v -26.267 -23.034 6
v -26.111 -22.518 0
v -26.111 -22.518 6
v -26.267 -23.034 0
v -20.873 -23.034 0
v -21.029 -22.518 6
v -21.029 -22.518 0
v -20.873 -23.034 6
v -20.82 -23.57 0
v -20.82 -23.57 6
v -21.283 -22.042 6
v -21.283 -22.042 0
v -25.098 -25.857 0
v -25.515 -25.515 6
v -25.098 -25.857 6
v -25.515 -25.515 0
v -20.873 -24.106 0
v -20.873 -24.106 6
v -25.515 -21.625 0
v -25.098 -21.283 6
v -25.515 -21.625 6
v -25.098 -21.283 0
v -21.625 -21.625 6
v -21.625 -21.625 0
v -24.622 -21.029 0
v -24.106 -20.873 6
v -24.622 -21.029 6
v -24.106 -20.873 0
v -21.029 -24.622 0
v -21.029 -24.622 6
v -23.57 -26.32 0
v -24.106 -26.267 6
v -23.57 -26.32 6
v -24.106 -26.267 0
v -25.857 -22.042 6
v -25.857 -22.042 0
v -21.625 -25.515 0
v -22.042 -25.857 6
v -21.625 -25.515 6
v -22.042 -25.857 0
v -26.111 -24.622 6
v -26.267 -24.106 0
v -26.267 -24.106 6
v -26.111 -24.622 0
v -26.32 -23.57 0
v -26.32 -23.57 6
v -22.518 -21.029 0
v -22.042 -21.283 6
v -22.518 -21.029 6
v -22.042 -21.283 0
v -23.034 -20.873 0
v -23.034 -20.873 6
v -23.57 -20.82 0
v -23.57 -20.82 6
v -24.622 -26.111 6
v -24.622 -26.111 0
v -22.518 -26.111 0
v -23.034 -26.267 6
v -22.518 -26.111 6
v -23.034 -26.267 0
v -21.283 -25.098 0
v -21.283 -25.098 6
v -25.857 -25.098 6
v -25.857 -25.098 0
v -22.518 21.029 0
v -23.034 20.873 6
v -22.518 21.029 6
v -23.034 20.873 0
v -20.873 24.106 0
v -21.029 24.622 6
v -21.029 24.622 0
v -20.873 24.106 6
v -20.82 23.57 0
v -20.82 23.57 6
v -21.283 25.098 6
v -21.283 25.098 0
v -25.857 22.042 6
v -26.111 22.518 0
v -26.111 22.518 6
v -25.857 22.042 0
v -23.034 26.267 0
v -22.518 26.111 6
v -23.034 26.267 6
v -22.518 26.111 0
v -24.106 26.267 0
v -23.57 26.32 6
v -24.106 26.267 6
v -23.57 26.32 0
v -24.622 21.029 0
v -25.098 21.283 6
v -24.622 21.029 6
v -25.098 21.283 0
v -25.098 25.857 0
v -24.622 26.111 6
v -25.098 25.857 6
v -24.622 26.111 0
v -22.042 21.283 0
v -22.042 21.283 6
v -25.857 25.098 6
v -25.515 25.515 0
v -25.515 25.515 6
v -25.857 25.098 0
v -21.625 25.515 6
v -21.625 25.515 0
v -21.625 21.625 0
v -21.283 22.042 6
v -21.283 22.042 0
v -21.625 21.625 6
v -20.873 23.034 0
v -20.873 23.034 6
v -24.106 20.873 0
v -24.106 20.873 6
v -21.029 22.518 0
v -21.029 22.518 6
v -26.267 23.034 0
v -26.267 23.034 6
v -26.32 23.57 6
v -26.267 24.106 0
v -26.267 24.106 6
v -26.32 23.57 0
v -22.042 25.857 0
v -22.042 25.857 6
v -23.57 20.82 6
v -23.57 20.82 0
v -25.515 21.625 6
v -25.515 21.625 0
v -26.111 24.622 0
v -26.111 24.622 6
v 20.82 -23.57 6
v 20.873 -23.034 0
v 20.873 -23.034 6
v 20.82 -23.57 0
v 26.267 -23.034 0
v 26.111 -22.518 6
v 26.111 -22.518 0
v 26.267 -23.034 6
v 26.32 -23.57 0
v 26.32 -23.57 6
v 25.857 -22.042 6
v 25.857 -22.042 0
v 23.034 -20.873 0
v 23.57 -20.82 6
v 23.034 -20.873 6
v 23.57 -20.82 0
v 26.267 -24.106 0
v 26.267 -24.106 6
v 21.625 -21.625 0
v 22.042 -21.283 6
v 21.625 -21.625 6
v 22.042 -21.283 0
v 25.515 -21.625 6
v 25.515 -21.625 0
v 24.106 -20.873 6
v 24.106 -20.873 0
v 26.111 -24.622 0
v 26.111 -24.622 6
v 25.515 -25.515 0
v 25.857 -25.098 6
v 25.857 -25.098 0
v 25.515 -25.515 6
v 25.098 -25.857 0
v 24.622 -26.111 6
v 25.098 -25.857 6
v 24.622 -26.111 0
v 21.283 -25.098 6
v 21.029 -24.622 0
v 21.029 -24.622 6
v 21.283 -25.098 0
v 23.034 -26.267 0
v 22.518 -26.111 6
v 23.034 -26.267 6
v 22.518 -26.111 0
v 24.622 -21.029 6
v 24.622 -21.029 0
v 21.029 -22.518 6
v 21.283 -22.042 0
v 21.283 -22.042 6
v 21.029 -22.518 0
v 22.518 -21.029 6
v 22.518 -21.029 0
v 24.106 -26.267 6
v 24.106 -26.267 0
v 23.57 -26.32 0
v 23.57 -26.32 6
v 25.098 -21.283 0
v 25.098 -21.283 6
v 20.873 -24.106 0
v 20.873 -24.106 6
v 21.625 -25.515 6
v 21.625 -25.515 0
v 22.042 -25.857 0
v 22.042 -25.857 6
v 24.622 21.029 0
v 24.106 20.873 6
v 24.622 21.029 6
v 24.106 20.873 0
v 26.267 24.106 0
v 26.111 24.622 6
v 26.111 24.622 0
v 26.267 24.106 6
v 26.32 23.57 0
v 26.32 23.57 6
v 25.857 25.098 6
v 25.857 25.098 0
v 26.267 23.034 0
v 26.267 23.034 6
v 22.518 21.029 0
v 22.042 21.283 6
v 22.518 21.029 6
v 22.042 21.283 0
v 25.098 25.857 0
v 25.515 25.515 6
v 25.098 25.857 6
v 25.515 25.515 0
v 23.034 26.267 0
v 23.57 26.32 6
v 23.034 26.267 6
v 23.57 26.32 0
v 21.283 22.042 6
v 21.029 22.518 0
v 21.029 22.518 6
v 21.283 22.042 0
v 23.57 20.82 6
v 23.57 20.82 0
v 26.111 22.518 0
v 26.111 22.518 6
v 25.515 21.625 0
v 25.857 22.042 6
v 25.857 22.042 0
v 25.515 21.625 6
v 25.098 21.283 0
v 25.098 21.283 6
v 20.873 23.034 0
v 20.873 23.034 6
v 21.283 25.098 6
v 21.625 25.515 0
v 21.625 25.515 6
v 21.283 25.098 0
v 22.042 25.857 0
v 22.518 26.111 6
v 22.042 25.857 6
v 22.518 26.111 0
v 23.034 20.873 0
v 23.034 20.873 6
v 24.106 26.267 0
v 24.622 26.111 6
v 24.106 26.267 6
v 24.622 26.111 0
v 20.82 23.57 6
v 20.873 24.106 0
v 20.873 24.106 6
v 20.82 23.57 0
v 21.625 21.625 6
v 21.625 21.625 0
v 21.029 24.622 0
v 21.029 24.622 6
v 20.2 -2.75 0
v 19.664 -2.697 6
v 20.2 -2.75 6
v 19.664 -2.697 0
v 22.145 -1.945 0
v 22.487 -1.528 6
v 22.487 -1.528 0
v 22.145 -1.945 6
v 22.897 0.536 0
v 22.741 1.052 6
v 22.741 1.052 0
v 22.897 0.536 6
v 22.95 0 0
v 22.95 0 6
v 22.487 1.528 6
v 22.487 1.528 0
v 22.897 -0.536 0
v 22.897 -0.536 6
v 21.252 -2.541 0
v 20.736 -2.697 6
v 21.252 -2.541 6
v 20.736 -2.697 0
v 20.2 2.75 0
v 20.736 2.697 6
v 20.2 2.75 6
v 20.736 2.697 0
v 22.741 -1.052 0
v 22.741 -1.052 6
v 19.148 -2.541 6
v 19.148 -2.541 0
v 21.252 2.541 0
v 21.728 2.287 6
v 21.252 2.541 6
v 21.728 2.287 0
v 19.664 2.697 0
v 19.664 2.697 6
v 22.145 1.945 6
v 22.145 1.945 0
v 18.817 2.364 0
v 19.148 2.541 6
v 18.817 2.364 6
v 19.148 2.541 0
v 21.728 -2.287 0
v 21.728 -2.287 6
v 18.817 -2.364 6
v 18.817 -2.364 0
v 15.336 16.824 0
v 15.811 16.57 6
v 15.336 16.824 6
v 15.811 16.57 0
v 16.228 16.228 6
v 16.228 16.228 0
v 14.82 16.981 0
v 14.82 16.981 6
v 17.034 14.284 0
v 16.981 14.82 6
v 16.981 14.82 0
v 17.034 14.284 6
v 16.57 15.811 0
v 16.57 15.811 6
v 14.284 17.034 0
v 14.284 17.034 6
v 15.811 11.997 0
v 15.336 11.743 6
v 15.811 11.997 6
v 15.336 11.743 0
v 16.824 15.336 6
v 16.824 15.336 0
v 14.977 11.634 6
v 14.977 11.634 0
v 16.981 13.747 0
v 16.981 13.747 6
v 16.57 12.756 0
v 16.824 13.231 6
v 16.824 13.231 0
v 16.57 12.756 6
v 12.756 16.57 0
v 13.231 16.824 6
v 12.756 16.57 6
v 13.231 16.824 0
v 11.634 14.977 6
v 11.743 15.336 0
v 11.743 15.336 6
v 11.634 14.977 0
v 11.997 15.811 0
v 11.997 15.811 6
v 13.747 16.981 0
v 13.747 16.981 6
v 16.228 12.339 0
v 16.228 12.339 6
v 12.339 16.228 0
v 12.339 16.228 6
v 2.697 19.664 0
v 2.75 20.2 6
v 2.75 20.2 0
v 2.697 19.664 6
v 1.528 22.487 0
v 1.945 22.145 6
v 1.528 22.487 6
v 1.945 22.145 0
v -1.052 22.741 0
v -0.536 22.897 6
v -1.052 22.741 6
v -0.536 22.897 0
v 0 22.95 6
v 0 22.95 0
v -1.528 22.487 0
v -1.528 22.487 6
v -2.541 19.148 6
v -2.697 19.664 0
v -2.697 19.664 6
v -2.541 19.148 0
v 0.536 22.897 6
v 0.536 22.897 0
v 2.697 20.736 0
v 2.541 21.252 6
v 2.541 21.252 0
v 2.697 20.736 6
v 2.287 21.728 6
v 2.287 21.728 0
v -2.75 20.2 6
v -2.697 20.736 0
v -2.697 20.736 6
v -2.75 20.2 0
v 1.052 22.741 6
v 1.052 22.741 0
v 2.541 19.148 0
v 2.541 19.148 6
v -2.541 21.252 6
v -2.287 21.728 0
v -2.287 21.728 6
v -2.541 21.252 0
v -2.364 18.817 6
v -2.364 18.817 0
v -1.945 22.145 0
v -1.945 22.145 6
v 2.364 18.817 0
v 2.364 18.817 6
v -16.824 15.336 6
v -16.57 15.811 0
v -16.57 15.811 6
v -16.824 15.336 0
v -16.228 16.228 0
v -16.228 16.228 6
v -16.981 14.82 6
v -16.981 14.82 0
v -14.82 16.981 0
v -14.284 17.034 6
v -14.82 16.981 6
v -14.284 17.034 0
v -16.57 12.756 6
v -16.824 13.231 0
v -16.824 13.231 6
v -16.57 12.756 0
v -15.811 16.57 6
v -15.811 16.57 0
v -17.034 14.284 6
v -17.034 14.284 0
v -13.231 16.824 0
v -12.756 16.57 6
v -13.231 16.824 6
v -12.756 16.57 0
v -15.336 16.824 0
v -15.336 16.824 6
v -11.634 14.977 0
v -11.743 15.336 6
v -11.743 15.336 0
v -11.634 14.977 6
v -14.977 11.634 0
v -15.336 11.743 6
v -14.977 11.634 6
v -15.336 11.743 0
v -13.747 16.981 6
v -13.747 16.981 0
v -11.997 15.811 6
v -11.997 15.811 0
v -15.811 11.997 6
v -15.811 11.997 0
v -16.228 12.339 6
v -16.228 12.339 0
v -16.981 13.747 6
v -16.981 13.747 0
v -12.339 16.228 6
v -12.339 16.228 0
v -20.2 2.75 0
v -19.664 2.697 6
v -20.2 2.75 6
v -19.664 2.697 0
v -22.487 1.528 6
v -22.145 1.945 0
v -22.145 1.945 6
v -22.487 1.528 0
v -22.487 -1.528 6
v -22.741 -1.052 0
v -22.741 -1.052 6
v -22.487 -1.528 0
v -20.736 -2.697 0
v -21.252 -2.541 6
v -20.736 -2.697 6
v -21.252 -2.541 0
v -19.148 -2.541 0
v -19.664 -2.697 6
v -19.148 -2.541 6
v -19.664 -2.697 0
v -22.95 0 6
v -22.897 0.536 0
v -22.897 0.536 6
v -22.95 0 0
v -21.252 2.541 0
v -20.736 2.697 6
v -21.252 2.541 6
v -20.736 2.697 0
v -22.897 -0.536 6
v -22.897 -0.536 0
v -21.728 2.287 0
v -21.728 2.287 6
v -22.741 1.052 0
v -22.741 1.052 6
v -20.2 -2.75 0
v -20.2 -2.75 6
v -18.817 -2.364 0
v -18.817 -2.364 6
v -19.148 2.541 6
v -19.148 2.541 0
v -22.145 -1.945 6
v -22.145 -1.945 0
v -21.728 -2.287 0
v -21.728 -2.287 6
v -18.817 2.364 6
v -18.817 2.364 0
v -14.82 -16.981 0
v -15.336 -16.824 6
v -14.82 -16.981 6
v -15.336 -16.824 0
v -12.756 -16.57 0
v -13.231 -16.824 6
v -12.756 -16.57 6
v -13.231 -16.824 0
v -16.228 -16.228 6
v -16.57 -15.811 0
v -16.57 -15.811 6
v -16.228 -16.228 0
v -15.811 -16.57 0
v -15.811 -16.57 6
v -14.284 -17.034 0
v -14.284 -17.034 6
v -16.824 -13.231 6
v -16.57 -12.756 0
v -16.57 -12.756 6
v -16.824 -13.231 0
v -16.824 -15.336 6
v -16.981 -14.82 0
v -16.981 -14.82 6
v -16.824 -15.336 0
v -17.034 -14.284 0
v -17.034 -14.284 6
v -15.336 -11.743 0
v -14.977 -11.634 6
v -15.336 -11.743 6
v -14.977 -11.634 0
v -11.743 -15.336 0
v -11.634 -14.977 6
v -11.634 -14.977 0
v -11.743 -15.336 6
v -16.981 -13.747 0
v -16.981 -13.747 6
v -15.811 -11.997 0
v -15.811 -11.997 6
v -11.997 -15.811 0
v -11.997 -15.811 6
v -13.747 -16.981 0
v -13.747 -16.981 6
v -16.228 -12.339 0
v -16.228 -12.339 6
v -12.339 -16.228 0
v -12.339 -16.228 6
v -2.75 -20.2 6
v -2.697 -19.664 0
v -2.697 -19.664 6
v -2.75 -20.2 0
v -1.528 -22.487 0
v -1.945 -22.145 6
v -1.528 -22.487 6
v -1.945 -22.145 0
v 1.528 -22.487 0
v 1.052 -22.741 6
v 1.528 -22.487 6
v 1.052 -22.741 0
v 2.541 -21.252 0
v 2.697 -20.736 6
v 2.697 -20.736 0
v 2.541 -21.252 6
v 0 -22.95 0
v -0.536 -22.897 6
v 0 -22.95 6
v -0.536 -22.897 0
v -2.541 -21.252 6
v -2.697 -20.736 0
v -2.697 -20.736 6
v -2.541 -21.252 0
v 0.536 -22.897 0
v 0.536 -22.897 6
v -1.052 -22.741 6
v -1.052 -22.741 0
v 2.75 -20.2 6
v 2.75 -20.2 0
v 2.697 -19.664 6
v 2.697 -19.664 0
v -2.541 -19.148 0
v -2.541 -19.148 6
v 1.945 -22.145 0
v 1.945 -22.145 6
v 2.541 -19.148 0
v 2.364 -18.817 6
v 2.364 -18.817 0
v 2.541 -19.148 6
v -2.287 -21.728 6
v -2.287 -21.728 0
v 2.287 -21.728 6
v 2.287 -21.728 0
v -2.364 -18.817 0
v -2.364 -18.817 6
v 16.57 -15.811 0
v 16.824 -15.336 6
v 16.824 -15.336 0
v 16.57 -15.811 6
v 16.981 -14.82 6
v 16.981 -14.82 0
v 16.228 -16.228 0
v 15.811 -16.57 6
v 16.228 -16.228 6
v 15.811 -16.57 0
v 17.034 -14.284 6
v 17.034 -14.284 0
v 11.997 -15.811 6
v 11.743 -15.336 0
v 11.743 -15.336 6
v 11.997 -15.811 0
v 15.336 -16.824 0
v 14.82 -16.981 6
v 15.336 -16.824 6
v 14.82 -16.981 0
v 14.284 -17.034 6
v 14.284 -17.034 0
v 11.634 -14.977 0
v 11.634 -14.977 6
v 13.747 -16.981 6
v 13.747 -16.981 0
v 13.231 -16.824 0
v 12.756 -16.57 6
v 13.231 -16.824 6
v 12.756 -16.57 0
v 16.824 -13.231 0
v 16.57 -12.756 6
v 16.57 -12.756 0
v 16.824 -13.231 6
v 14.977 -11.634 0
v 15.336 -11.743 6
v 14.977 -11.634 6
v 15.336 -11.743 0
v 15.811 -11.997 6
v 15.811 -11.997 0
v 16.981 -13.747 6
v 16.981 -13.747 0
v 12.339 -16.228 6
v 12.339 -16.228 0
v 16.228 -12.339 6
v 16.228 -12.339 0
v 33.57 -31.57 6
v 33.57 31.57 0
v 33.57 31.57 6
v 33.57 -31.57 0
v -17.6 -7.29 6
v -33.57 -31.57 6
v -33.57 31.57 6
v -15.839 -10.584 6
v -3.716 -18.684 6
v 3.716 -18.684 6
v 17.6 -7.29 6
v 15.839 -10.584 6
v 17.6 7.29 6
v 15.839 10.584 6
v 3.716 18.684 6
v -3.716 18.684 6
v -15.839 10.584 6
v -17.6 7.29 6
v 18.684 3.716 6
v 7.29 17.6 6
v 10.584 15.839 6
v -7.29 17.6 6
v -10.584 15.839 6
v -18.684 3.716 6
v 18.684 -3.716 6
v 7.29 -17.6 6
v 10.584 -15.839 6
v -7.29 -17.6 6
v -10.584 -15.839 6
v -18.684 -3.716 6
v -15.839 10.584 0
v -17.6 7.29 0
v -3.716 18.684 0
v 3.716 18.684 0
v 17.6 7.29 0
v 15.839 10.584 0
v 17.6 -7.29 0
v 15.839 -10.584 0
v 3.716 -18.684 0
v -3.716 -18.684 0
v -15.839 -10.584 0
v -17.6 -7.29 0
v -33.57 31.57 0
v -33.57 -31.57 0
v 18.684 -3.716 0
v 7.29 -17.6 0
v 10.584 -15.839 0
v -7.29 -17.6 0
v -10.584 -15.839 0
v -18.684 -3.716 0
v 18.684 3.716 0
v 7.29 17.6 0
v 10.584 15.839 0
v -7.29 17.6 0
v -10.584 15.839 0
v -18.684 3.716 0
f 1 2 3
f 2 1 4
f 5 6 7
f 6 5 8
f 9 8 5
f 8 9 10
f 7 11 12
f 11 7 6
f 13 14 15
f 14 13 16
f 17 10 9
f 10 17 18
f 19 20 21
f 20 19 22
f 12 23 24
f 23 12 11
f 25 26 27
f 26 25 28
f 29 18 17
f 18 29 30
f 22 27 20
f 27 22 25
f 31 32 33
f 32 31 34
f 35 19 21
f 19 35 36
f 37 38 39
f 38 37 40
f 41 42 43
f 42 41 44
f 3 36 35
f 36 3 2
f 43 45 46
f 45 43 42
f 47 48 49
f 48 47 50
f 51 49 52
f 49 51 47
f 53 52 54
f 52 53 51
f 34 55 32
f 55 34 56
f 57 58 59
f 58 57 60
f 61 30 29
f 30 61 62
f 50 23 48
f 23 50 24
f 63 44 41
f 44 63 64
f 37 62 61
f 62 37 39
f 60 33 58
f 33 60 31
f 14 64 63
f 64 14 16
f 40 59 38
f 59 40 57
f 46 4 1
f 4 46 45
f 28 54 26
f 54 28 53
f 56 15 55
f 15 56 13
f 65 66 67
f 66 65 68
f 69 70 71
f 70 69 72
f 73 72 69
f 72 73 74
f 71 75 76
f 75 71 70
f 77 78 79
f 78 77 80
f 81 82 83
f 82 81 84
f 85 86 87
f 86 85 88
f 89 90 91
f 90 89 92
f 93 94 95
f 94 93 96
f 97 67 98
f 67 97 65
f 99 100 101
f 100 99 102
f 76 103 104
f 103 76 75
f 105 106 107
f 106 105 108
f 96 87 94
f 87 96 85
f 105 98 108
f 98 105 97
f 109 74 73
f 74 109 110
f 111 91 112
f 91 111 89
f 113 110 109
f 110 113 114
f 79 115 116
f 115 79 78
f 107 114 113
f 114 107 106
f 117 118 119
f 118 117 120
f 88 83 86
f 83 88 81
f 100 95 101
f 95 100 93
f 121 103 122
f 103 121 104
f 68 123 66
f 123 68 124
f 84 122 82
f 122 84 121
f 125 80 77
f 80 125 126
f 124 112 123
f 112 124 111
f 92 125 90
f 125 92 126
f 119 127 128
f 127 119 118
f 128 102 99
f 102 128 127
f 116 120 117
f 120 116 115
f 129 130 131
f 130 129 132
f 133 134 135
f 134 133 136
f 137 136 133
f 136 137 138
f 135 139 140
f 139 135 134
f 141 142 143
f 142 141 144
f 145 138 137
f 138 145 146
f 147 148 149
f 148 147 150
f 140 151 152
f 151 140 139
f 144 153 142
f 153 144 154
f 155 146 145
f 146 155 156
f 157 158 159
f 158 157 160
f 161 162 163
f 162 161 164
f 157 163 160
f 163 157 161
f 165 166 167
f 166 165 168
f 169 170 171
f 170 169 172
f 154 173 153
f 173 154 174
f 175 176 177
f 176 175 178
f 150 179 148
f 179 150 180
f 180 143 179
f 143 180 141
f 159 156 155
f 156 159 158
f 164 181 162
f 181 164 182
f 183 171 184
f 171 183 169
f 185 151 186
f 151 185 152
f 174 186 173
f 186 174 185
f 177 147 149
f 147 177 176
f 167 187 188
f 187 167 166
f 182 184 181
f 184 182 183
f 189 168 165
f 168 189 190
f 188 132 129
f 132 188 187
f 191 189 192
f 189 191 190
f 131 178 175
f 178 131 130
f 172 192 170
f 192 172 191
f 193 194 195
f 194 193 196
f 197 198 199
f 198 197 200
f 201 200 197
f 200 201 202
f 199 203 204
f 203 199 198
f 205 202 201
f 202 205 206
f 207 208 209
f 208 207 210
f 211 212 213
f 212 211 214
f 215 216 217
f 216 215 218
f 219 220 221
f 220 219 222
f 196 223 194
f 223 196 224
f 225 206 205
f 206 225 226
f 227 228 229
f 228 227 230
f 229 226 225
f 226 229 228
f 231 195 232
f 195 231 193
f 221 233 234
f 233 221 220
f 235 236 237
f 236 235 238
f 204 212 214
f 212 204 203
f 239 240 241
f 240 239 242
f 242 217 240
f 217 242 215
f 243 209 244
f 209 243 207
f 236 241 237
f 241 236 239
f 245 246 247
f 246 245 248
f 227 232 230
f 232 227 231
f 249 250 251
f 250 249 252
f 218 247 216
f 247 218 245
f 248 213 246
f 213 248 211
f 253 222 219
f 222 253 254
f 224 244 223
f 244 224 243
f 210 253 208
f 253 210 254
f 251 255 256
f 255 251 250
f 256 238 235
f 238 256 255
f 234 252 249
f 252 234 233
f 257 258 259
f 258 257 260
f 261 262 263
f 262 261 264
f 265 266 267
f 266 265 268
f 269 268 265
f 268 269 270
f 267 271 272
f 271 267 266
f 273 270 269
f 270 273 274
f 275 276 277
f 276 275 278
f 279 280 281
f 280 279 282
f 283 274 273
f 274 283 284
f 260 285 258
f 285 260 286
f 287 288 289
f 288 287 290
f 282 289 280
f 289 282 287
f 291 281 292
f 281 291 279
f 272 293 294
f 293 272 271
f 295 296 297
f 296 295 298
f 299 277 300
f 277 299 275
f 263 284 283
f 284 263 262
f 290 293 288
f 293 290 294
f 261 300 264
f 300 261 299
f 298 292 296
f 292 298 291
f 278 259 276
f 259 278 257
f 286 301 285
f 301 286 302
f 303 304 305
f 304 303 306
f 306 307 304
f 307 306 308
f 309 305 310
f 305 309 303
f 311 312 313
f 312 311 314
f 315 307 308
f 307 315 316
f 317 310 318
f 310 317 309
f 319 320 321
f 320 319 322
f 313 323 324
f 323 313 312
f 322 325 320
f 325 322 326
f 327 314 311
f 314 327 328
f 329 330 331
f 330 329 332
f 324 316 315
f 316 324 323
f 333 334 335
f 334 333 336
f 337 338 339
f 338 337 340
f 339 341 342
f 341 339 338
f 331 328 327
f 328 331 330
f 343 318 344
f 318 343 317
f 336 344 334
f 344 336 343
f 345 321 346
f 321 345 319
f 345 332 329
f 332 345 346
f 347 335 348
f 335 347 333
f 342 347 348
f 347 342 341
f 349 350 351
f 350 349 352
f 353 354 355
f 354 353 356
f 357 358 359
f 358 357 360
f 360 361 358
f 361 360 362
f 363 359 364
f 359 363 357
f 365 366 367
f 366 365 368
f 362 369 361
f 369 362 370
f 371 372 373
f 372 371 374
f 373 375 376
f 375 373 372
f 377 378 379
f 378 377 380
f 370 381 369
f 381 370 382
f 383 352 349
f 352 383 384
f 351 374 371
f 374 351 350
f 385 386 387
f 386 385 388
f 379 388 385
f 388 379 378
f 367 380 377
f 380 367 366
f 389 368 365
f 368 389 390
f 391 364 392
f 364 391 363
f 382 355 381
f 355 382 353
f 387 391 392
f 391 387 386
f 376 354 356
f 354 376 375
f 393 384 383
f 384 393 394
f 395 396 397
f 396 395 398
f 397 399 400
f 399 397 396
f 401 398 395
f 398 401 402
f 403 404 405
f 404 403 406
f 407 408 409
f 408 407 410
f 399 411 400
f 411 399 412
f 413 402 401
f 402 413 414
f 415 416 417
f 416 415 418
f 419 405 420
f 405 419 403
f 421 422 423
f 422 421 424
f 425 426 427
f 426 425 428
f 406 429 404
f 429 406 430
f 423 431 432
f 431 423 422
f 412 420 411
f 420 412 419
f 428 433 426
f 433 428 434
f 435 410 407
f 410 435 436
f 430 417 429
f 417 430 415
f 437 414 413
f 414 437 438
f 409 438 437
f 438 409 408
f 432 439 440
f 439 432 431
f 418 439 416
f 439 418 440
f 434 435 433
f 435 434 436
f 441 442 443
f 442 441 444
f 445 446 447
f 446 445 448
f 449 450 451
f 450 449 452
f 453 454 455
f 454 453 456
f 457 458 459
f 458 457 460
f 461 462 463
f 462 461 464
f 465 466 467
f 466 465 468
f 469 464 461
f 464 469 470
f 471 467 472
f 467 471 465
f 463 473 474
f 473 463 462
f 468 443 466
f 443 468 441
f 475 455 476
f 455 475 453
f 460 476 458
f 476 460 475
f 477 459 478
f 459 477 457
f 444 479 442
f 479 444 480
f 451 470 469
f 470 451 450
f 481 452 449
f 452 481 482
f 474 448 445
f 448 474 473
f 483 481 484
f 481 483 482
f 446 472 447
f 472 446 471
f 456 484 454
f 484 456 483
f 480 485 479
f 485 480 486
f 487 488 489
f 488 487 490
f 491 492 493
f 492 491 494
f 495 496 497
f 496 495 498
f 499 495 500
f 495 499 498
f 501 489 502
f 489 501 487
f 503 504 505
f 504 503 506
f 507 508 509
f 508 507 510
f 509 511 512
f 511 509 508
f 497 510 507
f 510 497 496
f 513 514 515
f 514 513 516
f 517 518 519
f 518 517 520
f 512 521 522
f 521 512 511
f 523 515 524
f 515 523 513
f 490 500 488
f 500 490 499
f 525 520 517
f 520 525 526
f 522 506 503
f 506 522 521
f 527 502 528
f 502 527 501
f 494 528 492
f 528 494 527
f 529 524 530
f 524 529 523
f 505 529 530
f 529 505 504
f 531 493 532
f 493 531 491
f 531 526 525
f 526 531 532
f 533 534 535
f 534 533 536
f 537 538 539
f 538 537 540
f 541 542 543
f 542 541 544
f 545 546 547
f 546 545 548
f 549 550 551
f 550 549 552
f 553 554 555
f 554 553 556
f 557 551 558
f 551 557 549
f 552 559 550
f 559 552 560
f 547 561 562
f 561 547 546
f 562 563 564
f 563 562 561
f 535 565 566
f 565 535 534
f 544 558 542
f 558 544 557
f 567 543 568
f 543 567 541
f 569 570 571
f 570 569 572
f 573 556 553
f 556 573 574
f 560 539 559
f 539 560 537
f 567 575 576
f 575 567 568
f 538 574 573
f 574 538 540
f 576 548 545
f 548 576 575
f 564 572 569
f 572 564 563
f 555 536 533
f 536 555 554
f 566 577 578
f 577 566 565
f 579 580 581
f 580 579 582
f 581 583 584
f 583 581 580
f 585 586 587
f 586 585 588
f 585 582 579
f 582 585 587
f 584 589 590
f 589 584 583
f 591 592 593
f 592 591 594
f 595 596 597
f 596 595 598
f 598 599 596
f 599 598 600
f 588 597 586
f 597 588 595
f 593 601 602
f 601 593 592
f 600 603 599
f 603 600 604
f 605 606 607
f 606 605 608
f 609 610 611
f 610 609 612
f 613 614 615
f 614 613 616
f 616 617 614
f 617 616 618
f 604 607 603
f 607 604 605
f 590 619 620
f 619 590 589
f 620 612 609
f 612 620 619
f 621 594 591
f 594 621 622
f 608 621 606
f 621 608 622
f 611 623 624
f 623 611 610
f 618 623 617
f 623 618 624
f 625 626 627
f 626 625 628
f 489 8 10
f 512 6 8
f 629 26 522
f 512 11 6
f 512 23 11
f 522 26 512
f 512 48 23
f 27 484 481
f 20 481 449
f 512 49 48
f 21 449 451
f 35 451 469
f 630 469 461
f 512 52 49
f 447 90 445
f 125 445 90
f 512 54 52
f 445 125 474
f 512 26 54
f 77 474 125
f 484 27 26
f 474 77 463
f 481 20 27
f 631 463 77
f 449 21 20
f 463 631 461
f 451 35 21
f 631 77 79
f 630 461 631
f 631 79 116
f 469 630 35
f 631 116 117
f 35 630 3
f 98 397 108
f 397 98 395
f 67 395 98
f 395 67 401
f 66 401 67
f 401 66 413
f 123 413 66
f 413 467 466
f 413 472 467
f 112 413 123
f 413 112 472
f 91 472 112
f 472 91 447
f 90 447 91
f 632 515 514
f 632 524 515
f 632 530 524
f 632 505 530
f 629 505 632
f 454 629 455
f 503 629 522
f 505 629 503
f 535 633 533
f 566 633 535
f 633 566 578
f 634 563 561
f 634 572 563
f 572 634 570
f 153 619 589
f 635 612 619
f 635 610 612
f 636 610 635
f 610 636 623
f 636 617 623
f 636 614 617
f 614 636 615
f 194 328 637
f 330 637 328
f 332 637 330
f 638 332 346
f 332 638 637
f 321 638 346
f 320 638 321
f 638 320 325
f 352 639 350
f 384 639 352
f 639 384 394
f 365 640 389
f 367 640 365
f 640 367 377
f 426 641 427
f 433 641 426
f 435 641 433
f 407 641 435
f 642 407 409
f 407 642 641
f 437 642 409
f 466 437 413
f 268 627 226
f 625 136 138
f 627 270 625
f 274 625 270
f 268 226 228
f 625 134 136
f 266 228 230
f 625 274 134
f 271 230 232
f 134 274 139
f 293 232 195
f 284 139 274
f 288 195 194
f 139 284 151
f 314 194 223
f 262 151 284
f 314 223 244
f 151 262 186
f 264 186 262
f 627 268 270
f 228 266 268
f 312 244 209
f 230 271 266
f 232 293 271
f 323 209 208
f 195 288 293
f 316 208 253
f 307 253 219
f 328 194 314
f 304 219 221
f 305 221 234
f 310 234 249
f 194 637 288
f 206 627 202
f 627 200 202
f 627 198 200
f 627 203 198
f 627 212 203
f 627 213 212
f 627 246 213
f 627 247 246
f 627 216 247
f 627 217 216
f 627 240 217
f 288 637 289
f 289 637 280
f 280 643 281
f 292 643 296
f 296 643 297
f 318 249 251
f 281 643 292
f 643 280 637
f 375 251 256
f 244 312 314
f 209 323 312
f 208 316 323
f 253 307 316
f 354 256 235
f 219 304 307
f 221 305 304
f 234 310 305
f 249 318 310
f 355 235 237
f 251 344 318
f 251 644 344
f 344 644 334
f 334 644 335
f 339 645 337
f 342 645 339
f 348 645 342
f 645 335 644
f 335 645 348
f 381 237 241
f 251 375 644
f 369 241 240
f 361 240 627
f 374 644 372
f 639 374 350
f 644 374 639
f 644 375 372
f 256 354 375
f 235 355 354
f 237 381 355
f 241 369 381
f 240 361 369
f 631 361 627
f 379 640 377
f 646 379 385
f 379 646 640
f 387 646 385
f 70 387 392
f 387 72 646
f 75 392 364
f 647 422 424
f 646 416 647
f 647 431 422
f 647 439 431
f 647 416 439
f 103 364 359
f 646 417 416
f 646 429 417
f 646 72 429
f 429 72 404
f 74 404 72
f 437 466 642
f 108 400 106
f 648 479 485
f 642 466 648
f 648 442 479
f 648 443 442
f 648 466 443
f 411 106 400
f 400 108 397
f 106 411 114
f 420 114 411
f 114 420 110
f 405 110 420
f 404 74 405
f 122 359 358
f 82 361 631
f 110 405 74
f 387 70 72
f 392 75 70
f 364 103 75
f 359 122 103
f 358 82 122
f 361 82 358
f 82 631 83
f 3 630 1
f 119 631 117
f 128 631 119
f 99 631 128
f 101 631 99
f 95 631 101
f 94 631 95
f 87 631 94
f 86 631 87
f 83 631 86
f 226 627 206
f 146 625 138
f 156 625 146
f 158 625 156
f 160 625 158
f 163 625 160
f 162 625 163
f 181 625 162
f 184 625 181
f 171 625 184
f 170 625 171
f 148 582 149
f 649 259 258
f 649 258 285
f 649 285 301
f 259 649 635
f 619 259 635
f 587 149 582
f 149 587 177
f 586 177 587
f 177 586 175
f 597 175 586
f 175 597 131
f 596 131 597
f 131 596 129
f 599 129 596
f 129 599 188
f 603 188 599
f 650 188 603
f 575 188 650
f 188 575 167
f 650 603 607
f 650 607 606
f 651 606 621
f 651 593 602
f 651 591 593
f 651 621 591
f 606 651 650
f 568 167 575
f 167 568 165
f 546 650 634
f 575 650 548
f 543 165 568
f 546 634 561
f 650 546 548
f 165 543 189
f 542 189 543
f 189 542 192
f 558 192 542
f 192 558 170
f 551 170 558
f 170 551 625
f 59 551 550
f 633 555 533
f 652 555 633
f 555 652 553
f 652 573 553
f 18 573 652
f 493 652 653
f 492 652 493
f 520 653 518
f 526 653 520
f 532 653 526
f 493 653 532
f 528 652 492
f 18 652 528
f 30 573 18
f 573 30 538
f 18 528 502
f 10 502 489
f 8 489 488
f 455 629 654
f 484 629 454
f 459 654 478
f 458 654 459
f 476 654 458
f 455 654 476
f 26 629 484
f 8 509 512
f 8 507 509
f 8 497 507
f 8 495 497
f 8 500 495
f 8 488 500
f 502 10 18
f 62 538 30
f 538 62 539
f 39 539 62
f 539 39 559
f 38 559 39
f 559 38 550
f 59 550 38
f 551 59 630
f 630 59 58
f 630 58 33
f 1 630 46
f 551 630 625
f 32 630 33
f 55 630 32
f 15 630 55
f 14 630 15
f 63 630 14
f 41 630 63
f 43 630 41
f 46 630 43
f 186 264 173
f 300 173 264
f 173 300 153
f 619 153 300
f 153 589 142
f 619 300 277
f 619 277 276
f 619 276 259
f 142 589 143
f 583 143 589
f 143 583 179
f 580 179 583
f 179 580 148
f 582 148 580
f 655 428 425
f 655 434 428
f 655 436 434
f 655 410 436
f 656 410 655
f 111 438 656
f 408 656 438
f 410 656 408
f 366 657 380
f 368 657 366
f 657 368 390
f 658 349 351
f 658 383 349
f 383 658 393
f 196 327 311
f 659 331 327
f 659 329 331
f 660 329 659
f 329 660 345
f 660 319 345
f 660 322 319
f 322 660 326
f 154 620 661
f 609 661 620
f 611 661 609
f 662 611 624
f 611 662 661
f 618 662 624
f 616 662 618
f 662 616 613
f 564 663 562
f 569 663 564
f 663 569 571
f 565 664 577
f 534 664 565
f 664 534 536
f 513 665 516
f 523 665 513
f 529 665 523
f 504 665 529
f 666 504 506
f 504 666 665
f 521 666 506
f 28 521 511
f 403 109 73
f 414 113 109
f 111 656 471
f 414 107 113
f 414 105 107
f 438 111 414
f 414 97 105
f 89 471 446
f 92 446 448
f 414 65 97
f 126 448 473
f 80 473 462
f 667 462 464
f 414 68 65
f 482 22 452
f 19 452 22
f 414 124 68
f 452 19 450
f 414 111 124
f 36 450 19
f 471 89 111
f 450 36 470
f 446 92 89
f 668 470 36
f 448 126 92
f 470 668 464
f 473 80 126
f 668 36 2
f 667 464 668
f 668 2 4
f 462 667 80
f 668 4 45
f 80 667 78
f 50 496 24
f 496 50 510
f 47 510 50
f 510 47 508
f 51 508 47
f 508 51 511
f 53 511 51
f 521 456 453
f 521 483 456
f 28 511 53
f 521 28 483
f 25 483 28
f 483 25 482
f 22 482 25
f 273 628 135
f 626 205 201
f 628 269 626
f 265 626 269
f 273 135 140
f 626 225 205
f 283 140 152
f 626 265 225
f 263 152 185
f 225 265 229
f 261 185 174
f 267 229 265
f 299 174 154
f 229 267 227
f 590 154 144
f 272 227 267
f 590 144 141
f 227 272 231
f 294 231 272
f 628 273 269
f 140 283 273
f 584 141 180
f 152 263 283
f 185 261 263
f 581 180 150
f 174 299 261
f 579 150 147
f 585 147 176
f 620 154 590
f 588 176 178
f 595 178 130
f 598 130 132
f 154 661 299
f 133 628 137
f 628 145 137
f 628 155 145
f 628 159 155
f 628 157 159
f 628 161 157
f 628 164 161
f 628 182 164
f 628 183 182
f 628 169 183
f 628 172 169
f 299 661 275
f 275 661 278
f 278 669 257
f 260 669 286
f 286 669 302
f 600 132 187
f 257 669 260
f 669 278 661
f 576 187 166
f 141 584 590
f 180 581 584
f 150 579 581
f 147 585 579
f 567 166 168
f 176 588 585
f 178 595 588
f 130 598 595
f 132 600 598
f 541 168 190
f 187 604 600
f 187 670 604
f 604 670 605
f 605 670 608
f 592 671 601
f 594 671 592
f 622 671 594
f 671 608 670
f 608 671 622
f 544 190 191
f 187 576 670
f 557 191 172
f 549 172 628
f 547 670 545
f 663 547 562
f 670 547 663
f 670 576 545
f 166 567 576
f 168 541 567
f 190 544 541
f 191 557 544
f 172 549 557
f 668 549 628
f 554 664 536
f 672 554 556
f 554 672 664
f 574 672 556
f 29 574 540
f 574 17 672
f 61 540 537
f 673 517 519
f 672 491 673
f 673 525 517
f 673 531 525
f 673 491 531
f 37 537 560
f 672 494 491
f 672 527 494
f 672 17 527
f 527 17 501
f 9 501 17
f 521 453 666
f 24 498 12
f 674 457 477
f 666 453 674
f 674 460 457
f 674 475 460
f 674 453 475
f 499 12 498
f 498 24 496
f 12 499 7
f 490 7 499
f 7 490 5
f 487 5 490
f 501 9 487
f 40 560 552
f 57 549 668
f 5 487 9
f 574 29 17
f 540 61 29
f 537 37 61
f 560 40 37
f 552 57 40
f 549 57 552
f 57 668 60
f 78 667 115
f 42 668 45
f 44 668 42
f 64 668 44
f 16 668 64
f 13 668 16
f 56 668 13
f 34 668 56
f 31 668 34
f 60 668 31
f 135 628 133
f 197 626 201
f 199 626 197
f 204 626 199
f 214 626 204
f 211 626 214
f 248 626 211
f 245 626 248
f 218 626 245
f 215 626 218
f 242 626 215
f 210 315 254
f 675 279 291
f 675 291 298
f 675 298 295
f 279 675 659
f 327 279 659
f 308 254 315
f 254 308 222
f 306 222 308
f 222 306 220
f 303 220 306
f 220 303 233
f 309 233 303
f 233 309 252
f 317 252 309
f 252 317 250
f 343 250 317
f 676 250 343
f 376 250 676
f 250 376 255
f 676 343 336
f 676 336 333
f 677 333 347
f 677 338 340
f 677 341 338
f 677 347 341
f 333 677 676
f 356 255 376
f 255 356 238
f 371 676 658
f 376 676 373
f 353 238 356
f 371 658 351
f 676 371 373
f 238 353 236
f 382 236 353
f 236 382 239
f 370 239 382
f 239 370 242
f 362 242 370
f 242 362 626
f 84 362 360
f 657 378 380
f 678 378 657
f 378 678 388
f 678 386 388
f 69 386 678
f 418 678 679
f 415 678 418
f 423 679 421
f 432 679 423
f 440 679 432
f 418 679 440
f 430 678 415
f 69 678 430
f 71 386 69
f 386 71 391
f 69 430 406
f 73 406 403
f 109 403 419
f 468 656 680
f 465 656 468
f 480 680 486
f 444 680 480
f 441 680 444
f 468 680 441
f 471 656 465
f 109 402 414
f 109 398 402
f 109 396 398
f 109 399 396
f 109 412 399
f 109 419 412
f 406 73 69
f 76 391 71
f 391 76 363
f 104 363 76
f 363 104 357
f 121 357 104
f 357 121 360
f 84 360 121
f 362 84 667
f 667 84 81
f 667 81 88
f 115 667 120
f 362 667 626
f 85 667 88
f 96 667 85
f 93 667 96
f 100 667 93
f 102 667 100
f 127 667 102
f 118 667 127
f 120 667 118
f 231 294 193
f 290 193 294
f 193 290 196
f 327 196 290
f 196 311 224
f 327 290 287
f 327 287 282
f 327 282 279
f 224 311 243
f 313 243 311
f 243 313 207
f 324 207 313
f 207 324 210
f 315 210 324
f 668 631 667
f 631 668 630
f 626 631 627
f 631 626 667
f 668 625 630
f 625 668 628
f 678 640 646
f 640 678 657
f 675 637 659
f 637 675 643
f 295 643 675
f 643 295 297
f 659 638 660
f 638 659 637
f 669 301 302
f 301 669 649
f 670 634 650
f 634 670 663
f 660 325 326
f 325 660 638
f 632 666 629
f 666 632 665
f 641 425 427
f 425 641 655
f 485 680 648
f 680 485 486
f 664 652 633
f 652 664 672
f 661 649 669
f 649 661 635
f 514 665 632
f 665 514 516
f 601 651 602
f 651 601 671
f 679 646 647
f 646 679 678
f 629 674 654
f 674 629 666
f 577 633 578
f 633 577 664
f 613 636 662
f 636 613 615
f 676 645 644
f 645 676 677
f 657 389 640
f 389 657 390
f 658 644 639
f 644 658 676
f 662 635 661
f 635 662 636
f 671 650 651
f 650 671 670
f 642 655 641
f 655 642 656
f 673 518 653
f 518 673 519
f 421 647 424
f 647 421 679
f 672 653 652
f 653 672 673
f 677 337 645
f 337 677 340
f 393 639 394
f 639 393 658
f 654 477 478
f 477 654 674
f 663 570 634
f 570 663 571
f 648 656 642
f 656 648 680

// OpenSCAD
$fn = 32;

// ----------------------------------------------------------------------
// Motor mount plate: NEMA23, 67.14 x 63.14 x 6 mm
// ----------------------------------------------------------------------

// --- parameters (mm) ---
base_x = 67.14;           // plate length, X
base_y = 63.14;           // plate width, Y
thick = 6;                // plate thickness
bolt_pitch = 47.14;       // NEMA23 bolt spacing
motor_d = 5.5;            // NEMA23 screw clearance
boss_hole = 38.1;         // pilot boss bore
second_d = 5.5;           // second fastener hole
bc_r = 20.2;              // second bolt circle radius
bc_n = 8;                 // second bolt circle count

module plate() {
  translate([-base_x / 2, -base_y / 2, 0]) cube([base_x, base_y, thick]);
}

module motor_holes() {
  for (sx = [-1, 1]) for (sy = [-1, 1])
    translate([sx * bolt_pitch / 2, sy * bolt_pitch / 2, -1])
      cylinder(h = thick + 2, d = motor_d);
}

difference() {
  union() {
    plate();
  }
  motor_holes();
  translate([0, 0, -1]) cylinder(h = thick + 2, d = boss_hole);
  for (i = [0 : bc_n - 1]) rotate([0, 0, i * 360 / bc_n]) translate([bc_r, 0, -1])    cylinder(h = thick + 2, d = second_d);
}
